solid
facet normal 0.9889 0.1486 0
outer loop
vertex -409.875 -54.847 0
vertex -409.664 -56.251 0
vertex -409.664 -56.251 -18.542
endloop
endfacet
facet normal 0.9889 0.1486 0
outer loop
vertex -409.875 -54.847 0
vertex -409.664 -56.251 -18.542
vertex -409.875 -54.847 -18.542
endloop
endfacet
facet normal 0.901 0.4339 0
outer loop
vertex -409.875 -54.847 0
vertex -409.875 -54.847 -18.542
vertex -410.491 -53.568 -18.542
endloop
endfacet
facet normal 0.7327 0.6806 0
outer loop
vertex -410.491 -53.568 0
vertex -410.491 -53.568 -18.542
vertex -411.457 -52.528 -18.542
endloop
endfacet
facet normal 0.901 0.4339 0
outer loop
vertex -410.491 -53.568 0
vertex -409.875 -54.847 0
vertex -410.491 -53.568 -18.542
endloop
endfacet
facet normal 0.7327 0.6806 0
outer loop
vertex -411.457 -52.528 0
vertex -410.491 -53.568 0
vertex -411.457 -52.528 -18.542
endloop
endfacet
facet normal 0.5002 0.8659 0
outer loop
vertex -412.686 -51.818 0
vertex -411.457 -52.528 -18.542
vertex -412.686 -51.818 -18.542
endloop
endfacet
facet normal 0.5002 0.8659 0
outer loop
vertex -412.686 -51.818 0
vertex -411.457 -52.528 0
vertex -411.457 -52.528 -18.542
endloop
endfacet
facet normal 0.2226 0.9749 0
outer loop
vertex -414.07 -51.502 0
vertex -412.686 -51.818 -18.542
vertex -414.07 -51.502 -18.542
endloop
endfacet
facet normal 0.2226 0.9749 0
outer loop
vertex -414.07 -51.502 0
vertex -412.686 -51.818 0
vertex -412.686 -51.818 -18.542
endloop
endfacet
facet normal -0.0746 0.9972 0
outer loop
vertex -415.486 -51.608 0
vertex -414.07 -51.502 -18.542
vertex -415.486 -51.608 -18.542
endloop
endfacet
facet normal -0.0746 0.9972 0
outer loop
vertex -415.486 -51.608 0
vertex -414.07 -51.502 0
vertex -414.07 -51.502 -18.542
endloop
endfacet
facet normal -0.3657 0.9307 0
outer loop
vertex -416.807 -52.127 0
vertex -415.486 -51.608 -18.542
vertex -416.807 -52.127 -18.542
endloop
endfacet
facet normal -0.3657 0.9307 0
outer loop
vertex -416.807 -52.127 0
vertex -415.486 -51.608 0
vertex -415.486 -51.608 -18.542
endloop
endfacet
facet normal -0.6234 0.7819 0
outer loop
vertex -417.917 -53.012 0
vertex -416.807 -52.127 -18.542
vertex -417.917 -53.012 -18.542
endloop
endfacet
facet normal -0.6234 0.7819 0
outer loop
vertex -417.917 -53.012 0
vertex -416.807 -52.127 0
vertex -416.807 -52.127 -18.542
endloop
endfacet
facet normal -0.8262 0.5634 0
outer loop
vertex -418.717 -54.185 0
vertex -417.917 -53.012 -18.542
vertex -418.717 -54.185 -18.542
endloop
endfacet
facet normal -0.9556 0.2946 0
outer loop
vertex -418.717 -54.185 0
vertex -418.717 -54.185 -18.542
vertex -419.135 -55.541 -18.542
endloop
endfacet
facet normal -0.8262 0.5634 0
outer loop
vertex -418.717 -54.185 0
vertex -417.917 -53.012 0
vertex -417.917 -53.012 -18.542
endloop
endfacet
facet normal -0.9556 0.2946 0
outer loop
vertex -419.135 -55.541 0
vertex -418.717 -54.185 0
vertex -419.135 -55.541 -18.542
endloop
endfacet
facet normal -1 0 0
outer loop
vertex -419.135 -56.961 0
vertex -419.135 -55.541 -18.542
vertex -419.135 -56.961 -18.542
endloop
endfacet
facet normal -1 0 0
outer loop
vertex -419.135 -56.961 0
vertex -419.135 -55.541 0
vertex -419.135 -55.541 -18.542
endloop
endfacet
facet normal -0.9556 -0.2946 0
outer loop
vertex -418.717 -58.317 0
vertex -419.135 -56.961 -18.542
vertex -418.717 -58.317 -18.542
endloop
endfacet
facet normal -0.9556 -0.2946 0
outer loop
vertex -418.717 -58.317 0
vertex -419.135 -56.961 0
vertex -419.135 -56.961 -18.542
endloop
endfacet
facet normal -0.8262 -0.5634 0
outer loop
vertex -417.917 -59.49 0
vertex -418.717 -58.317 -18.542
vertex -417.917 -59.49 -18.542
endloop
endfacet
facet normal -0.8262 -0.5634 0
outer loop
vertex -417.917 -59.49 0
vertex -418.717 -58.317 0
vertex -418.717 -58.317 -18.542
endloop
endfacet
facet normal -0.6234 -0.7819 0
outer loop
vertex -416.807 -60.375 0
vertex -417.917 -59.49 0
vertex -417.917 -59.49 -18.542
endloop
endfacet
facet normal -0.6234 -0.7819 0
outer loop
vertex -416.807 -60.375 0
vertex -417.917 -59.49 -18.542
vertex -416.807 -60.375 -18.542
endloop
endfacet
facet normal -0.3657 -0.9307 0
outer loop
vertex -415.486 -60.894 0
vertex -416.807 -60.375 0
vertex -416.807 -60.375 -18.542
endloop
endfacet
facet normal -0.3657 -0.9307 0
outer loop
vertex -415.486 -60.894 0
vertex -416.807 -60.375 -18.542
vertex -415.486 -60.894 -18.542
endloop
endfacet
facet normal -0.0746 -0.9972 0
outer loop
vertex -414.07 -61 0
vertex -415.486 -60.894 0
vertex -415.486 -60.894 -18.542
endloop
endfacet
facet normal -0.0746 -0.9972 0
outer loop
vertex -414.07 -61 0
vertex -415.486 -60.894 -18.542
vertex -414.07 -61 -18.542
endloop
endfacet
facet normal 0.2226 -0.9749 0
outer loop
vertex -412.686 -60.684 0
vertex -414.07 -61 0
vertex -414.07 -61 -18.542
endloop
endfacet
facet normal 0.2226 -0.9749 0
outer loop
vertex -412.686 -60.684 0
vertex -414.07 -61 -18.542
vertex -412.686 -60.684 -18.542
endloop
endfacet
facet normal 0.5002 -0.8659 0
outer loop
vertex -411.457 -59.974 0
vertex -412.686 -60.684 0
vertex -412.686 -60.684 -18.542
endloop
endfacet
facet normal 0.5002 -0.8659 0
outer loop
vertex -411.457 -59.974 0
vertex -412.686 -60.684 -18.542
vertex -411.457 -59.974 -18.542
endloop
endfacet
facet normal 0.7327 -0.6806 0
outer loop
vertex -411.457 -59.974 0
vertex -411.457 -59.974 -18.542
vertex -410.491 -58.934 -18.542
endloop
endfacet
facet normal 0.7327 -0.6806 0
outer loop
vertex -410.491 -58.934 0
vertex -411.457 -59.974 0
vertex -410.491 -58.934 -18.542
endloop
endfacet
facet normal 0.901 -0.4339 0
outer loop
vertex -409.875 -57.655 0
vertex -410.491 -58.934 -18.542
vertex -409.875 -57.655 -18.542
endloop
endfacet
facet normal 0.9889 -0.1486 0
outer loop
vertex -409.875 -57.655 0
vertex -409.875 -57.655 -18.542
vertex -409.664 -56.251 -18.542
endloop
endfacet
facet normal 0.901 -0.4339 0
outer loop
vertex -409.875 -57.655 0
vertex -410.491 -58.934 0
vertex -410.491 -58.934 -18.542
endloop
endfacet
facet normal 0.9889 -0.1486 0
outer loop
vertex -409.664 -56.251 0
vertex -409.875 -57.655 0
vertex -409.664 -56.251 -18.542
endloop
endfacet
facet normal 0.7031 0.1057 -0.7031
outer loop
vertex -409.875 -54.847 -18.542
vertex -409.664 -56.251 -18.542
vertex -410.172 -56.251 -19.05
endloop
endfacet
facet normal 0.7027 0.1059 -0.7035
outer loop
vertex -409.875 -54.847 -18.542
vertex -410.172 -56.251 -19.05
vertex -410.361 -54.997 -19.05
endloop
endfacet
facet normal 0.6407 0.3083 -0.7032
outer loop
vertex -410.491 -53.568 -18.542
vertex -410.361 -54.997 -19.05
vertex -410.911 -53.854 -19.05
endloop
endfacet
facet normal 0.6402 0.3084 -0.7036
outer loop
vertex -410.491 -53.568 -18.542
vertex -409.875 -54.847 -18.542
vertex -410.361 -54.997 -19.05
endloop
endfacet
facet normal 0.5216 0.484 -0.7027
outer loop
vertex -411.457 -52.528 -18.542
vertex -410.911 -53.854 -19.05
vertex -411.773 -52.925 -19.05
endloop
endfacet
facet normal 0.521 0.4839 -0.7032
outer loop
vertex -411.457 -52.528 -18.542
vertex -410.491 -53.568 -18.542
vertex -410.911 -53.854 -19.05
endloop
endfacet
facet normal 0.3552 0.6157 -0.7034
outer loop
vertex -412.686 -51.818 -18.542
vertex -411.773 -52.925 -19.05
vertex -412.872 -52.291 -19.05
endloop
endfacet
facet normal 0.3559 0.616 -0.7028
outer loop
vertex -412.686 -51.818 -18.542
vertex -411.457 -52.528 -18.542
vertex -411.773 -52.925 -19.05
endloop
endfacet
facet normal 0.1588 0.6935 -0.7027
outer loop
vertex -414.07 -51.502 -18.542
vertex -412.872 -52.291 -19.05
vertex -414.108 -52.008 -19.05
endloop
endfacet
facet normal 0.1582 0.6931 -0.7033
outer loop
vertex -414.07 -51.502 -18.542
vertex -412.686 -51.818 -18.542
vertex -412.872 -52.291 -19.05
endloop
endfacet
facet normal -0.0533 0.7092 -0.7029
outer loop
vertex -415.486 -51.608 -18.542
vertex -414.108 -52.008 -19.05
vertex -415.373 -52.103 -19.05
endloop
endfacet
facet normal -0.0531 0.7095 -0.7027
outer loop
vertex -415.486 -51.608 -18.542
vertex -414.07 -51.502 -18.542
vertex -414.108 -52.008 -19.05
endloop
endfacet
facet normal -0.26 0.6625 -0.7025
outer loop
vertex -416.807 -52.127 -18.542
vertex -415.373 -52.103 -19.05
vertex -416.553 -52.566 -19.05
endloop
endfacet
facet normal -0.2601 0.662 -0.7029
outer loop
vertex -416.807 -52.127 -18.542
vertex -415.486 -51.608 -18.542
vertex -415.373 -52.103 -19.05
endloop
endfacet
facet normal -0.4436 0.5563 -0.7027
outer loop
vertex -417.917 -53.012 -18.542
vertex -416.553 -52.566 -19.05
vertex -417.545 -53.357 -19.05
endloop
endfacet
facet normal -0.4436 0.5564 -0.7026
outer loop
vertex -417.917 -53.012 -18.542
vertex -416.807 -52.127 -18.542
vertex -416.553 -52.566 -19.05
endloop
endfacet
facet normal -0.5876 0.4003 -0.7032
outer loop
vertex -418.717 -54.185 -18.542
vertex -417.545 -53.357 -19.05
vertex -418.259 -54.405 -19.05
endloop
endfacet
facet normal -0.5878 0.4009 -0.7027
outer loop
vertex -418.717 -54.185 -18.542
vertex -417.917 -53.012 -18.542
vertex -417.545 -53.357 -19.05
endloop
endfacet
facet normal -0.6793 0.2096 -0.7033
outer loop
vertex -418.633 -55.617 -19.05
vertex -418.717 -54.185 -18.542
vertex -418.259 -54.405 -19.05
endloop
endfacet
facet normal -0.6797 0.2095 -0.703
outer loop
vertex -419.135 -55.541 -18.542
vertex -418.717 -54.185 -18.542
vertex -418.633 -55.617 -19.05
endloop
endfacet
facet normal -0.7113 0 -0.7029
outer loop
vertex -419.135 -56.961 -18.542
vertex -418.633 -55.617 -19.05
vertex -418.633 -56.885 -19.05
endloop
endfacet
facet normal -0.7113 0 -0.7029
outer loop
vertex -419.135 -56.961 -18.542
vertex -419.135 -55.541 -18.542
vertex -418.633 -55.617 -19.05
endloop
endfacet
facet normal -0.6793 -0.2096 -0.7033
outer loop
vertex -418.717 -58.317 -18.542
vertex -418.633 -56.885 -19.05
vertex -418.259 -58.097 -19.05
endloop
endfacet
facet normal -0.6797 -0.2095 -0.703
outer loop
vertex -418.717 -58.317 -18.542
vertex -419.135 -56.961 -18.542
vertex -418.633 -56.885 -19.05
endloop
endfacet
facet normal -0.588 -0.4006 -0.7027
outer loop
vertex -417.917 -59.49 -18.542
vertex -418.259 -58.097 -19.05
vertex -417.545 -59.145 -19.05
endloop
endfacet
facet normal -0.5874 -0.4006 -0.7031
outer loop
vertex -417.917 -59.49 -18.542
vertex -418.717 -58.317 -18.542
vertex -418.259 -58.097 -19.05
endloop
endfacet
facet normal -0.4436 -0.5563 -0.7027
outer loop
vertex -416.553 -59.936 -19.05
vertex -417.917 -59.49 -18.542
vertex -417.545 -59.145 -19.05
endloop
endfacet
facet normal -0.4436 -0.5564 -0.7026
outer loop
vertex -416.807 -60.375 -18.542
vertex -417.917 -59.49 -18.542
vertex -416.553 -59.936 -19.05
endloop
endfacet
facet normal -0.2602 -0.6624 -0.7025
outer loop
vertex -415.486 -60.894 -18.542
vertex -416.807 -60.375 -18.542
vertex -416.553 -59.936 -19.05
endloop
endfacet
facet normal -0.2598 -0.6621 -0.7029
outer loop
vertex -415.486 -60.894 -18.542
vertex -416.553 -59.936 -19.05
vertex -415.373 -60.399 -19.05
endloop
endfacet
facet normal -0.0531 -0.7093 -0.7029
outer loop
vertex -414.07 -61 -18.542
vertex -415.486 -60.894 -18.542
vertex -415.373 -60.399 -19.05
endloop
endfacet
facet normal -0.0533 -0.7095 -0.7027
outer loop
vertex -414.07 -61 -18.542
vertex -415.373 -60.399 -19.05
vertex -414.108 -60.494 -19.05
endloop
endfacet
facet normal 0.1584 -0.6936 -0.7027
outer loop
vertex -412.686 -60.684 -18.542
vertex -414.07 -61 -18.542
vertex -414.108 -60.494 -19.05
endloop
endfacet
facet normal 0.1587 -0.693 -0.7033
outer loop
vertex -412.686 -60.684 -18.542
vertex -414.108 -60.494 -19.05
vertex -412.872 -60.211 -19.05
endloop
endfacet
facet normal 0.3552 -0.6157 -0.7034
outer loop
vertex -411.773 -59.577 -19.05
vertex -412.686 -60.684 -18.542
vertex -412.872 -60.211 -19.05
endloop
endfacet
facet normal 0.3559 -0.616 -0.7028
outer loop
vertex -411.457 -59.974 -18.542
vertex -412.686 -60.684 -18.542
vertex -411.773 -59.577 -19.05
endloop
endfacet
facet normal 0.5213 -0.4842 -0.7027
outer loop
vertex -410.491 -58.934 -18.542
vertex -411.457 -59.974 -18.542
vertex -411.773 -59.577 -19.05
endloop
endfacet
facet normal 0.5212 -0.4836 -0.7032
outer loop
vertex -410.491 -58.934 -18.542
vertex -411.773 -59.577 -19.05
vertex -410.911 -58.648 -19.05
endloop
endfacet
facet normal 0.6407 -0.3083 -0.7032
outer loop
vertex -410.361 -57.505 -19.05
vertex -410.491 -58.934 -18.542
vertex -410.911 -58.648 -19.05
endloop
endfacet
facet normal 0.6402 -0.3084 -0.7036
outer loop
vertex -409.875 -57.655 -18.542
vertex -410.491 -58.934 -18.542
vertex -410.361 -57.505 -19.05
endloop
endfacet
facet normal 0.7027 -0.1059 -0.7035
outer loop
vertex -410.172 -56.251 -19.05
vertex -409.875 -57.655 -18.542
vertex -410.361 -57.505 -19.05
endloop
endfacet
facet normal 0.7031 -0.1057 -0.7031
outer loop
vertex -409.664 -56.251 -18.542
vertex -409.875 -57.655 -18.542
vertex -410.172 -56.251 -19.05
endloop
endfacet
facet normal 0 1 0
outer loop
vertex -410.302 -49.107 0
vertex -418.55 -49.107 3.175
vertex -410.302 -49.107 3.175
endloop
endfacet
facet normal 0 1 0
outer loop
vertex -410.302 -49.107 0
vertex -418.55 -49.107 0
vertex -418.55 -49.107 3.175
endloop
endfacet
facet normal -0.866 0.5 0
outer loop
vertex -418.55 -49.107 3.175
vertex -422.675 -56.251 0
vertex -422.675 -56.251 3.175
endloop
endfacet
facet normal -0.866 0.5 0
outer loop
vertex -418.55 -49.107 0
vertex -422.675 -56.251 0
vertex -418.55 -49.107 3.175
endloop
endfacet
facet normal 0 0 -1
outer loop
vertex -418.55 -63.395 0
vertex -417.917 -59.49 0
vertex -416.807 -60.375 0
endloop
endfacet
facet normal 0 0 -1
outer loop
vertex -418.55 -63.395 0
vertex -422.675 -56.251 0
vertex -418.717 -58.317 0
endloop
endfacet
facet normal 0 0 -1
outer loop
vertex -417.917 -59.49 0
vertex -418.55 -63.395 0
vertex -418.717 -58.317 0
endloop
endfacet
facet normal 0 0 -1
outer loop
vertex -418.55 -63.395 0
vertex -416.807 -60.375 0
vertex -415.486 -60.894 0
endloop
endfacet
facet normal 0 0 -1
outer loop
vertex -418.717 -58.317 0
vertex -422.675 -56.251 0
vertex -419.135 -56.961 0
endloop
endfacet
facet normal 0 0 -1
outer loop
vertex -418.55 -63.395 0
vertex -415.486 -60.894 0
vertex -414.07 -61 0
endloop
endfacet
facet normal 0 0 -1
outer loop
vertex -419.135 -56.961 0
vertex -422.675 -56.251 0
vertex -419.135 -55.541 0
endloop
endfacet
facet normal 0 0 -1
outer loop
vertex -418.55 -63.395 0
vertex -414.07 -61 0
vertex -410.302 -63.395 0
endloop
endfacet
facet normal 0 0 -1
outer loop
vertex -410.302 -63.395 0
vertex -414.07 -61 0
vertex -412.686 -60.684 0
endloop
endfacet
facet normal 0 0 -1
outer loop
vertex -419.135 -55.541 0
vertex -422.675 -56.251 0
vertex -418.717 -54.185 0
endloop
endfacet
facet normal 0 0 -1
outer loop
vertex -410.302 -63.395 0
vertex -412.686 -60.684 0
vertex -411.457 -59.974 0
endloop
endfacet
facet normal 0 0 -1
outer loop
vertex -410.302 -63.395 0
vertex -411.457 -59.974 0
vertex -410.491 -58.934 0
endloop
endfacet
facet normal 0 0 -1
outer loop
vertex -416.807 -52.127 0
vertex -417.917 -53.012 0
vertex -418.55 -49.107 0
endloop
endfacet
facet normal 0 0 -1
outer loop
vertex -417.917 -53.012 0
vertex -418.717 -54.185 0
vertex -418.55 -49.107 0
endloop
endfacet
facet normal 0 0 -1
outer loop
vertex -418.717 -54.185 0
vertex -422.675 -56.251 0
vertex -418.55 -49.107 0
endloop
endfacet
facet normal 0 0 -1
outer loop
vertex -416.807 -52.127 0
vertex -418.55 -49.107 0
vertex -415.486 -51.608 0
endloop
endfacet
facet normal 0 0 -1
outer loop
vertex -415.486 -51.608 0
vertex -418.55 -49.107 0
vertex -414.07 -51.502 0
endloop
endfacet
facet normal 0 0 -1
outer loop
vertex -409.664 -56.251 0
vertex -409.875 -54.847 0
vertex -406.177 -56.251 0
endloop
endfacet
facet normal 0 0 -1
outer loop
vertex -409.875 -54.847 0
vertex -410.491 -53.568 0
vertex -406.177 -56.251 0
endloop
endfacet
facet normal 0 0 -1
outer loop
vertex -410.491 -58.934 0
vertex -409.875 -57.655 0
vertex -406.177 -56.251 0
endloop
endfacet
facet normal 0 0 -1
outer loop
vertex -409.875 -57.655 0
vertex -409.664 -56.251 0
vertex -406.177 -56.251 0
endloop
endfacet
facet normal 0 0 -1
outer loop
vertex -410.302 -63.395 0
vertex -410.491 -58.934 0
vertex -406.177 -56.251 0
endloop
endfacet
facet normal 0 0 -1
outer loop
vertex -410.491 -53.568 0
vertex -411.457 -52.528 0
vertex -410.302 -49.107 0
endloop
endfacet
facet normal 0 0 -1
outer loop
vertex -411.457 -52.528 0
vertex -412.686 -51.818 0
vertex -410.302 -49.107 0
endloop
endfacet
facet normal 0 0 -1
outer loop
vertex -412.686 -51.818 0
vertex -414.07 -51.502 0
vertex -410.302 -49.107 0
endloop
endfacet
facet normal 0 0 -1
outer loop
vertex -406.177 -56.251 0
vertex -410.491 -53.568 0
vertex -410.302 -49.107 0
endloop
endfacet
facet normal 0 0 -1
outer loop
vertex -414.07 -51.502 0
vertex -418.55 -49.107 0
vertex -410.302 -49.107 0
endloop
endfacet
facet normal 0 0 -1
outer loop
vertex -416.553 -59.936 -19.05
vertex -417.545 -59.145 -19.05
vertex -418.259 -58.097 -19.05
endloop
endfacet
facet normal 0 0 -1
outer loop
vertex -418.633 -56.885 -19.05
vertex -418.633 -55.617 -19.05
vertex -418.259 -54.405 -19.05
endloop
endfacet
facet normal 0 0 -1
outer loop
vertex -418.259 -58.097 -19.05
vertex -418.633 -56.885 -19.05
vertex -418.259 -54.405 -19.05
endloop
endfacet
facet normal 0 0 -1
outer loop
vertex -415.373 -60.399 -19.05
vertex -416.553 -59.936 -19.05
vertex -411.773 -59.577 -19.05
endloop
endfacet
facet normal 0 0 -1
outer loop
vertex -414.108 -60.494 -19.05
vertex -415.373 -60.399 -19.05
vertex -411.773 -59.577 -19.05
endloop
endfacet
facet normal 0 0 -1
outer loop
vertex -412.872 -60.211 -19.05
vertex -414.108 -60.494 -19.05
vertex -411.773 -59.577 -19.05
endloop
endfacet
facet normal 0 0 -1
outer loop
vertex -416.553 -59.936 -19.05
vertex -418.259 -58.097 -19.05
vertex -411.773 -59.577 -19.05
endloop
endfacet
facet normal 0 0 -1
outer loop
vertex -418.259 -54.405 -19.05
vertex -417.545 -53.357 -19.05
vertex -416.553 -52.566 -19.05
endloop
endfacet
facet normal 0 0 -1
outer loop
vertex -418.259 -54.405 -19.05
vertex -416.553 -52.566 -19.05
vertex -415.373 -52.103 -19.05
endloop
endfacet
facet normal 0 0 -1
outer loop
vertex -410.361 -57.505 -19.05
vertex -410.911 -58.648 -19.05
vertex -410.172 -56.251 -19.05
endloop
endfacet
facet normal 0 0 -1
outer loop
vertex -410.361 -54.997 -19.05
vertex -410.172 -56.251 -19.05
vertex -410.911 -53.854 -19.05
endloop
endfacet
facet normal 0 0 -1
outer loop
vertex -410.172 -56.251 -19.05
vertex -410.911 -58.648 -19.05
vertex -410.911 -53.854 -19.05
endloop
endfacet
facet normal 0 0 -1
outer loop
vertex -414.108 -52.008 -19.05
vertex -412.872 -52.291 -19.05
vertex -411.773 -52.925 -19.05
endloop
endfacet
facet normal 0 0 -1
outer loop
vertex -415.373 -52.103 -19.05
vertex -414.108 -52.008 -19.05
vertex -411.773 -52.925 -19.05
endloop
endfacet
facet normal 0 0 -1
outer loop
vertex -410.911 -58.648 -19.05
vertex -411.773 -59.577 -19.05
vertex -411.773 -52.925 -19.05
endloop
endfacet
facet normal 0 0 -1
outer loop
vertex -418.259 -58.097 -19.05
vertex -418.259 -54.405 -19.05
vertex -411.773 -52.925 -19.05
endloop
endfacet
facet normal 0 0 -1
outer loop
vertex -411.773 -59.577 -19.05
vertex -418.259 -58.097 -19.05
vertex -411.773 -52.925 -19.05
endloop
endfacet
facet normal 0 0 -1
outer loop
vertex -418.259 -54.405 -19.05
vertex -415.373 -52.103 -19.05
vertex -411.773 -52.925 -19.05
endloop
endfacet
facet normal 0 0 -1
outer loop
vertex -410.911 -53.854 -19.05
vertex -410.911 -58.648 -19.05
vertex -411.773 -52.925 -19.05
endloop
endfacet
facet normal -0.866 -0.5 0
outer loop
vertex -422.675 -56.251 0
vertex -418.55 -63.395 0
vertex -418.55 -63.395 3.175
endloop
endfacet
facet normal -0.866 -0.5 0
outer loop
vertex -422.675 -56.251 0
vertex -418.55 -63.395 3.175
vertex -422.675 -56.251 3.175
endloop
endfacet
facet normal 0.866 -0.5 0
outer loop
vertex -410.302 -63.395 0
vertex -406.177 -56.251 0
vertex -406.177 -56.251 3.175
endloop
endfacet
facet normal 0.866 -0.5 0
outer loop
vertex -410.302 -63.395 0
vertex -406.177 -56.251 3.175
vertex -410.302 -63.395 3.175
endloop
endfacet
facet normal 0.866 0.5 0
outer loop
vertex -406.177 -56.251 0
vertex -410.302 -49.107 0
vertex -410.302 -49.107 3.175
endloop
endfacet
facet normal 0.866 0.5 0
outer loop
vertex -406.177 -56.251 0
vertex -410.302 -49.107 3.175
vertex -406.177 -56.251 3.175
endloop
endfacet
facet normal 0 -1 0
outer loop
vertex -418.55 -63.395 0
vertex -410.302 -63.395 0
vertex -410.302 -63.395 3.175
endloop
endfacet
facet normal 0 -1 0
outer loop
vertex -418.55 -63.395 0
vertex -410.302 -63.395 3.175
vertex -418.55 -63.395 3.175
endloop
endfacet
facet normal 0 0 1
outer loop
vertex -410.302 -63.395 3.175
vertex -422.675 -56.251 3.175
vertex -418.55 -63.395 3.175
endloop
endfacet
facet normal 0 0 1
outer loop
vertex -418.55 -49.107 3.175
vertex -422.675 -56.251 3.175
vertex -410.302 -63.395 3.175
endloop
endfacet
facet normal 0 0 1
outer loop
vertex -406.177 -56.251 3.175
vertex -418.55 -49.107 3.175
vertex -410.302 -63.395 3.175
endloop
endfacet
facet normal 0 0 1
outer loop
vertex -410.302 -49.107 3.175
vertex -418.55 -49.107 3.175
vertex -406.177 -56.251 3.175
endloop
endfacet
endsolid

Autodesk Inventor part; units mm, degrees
ref_plane "YZ Plane" through (0, 0, 0) normal (1, 0, 0) x (0, 1, 0)
ref_plane "XZ Plane" through (0, 0, 0) normal (0, 1, 0) x (-1, 0, 0)
ref_plane "XY Plane" through (0, 0, 0) normal (0, 0, 1) x (1, 0, 0)
sketch "Sketch1" plane through (0, 0, 0) normal (0, 0, 1) x (1, 0, 0)
  circle A0 centre (-414.4261, -56.251) radius 4.7625
  point P0 (0, 0)
  dimension "d0" = 9.525
extrude "Extrusion1" add sketch "Sketch1" against normal blind 19.05
sketch "Sketch2" plane through (-414.4261, -56.251, 0) normal (0, 0, 1) x (1, 0, 0)
  circle A0 centre (0, 0) radius 4.7625 projected
  line L0 (-8.2489, 0) -> (-4.1244, 7.1437)
  line L1 (-4.1244, 7.1437) -> (4.1244, 7.1438)
  line L2 (4.1244, 7.1438) -> (8.2489, 0)
  line L3 (8.2489, 0) -> (4.1244, -7.1437)
  line L4 (4.1244, -7.1437) -> (-4.1244, -7.1438)
  line L5 (-4.1244, -7.1438) -> (-8.2489, 0)
  point P0 (414.4261, 56.251)
  dimension "d3" = 14.2875
extrude "Extrusion2" add sketch "Sketch2" along normal blind 3.175 contours A0 | L0 L1 L2 L3 L4 L5
thread "Thread1" size "3/8-16 UNC" class "2A" standard "ANSI Unified Screw Threads" full length
chamfer "Chamfer1" distance 0.508 angle 45 1 edges at (-419.1886, -56.251, -19.05)
properties part number "375 bolt x4" material "Steel"
